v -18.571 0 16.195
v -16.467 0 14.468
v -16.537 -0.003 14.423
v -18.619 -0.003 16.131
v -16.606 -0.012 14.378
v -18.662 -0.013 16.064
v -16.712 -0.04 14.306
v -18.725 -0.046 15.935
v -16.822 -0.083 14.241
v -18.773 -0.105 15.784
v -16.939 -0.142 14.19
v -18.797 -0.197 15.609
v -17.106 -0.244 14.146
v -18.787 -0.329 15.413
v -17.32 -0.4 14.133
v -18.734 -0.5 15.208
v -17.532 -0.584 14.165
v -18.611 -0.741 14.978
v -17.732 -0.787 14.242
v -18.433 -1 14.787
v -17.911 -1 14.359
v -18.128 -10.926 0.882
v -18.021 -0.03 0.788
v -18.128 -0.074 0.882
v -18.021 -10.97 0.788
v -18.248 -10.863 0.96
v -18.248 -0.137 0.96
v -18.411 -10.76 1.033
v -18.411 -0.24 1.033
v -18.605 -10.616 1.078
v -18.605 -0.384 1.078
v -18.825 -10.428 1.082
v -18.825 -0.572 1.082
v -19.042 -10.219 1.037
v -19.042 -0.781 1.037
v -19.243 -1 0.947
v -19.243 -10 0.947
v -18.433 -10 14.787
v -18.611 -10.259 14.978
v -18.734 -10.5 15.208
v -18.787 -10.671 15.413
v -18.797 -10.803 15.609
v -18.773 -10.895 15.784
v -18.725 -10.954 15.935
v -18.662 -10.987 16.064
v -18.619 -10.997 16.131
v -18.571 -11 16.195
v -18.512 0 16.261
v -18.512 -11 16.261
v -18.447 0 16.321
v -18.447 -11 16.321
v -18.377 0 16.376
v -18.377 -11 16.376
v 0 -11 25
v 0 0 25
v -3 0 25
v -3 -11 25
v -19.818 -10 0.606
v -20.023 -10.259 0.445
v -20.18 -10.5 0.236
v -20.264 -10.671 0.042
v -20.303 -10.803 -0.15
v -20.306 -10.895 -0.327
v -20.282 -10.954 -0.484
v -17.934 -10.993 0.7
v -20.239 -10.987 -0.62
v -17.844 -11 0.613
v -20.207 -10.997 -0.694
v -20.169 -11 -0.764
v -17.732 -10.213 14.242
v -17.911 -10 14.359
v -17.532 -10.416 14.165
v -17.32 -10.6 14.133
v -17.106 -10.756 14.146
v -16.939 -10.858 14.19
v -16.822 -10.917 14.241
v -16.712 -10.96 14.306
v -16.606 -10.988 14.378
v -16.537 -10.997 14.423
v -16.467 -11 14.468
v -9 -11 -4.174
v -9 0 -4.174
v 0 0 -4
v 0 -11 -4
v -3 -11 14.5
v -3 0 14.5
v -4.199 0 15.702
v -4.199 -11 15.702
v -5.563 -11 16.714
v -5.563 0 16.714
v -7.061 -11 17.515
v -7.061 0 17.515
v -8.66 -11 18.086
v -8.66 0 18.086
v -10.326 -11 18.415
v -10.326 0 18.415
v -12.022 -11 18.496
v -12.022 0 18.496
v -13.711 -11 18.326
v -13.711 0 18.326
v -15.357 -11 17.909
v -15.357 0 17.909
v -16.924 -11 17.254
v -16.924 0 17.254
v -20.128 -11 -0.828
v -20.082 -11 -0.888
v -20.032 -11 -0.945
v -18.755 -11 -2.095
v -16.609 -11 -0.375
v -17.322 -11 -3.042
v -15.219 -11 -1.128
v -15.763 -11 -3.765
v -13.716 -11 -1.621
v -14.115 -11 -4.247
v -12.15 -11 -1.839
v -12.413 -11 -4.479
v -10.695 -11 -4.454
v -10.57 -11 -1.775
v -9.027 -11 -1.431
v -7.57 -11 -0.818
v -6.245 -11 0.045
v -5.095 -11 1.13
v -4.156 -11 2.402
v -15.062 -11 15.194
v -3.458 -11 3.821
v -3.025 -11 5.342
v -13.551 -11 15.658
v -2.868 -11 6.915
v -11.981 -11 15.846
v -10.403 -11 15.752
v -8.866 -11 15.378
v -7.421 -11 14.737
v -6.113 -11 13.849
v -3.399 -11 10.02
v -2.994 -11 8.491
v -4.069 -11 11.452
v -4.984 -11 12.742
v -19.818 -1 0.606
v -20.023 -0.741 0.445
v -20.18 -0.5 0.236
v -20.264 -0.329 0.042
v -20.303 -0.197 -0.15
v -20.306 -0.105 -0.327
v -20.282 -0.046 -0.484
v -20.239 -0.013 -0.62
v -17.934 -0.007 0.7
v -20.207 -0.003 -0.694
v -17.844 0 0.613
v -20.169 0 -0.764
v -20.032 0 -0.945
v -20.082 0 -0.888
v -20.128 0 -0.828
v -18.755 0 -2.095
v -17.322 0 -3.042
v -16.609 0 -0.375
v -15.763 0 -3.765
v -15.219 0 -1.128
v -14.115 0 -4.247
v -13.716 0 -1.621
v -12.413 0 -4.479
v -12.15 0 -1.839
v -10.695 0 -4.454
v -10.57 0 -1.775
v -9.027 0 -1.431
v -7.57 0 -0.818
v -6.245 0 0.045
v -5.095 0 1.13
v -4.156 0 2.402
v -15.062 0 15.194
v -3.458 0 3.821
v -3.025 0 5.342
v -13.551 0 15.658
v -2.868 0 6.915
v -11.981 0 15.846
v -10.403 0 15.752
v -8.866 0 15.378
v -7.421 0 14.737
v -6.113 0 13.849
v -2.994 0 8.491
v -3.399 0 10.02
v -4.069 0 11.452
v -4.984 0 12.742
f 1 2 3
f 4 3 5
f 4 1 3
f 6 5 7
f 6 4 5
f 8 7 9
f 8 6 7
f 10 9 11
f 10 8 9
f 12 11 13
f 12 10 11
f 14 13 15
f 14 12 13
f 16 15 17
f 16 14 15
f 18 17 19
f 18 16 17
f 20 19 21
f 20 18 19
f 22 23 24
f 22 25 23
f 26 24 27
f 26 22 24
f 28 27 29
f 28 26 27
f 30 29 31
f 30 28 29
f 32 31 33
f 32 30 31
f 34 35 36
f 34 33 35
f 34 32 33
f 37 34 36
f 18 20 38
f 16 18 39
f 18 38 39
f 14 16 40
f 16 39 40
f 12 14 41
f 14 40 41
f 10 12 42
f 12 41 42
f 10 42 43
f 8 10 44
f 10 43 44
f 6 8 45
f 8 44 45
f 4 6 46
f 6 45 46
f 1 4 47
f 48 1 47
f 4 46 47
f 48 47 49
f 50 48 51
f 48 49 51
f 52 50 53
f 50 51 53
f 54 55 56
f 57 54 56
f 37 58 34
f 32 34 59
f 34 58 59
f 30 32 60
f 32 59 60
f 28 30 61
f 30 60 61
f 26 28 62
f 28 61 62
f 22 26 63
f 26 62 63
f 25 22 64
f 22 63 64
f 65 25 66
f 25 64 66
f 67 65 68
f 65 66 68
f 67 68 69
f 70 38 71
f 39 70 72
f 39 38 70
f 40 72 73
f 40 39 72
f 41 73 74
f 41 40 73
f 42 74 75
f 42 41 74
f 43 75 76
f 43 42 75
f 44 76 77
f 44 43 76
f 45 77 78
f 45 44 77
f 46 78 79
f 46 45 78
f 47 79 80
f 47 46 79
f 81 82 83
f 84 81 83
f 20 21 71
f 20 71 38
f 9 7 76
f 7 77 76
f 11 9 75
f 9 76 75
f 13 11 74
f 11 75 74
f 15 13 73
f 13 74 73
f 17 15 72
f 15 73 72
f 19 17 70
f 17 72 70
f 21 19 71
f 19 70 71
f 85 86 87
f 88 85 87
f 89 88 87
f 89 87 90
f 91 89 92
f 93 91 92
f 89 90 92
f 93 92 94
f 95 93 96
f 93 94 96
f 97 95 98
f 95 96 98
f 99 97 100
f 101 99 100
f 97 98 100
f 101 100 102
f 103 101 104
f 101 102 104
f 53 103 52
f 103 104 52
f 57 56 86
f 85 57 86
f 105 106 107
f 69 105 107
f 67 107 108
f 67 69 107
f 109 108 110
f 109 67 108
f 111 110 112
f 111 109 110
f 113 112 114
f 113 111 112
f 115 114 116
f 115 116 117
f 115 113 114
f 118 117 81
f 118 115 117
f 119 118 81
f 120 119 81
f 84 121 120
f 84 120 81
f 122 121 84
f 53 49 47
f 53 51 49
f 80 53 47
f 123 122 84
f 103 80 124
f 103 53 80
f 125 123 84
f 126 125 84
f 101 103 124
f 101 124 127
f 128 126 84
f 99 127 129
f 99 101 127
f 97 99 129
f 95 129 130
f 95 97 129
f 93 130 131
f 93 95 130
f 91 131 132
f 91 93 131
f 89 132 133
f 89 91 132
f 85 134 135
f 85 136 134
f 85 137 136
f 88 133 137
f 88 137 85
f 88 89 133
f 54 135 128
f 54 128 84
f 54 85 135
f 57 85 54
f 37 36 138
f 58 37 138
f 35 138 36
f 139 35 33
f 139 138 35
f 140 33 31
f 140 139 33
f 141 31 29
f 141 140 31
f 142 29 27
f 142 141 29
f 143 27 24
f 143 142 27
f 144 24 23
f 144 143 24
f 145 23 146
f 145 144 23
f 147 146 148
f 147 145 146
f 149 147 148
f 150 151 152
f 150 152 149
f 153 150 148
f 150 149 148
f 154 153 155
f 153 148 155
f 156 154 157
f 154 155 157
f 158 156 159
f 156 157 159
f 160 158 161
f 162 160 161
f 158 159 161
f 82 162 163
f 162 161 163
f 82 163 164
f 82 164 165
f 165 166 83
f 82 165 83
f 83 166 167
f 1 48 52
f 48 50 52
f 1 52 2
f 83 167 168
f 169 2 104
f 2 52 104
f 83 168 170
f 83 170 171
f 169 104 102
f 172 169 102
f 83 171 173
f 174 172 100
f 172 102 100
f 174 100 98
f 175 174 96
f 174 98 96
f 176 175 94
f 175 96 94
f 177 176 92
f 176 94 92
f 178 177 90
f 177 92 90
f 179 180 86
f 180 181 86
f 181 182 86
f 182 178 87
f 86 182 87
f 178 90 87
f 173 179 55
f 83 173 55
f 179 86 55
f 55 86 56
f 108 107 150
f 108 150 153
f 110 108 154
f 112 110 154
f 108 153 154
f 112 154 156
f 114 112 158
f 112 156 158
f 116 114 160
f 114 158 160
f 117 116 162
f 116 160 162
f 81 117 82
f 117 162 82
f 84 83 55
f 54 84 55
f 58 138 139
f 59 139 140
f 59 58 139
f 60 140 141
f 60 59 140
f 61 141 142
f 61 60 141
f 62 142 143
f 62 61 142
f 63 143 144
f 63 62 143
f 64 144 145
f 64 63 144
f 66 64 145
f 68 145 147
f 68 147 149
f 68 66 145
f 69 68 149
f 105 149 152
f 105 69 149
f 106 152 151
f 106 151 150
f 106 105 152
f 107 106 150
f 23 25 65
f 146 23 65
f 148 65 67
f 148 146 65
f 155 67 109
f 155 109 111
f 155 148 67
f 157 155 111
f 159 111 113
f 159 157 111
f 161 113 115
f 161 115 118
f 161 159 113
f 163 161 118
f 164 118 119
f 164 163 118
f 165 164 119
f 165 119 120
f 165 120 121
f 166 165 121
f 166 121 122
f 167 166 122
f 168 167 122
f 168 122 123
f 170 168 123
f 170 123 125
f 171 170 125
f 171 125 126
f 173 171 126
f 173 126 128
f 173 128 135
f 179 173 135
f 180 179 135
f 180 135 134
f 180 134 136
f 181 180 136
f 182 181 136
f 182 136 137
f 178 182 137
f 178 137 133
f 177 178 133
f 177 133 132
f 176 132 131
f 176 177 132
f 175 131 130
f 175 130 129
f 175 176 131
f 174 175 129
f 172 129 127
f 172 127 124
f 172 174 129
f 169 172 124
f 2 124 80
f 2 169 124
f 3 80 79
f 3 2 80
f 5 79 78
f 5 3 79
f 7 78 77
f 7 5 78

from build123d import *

# Parameters (mm, degrees)
PAD_DEPTH   = 11
FILLET_R    = 1
FILLET001_R = 1


with BuildPart() as part:
    # Sketch → Pad (new body)
    with BuildSketch(Plane.XZ):
        with BuildLine():
            Line((0, 0), (0, 25))
            Line((0, 25), (-3, 25))
            Line((-3, 25), (-3, 14.5))
            ThreePointArc((-3, 14.5), (-10.968465, 18.475561), (-19.386255, 15.569992))
            Line((-17.306046, 13.862505), (-19.386255, 15.569992))
            ThreePointArc((-18.539906, 1.362505), (-2.9106, 6.130653), (-17.306046, 13.862505))
            Line((-18.539906, 1.362505), (-20.841942, 0))
            ThreePointArc((-20.841942, 0), (-15.540935, -3.845903), (-9, -4.174237))
            Line((-9, -4.174237), (0, -4))
            Line((0, 0), (0, -4))
        make_face()
    extrude(amount=PAD_DEPTH)

    # Fillet
    fillet_edges = [part.edges().sort_by_distance(p)[0] for p in [
        (-18.539906, -5.5, 1.362505),
        (-20.841942, -5.5, 0),
        (-19.690924, 0, 0.681253),
        (-19.690924, -11, 0.681253),
    ]]
    fillet(fillet_edges, radius=FILLET_R)

    # Fillet001
    fillet001_edges = [part.edges().sort_by_distance(p)[0] for p in [
        (-17.306046, -5.5, 13.862505),
        (-19.386255, -5.5, 15.569992),
        (-18.346151, 0, 14.716249),
        (-18.346151, -11, 14.716249),
    ]]
    fillet(fillet001_edges, radius=FILLET001_R)


solid = part.part
